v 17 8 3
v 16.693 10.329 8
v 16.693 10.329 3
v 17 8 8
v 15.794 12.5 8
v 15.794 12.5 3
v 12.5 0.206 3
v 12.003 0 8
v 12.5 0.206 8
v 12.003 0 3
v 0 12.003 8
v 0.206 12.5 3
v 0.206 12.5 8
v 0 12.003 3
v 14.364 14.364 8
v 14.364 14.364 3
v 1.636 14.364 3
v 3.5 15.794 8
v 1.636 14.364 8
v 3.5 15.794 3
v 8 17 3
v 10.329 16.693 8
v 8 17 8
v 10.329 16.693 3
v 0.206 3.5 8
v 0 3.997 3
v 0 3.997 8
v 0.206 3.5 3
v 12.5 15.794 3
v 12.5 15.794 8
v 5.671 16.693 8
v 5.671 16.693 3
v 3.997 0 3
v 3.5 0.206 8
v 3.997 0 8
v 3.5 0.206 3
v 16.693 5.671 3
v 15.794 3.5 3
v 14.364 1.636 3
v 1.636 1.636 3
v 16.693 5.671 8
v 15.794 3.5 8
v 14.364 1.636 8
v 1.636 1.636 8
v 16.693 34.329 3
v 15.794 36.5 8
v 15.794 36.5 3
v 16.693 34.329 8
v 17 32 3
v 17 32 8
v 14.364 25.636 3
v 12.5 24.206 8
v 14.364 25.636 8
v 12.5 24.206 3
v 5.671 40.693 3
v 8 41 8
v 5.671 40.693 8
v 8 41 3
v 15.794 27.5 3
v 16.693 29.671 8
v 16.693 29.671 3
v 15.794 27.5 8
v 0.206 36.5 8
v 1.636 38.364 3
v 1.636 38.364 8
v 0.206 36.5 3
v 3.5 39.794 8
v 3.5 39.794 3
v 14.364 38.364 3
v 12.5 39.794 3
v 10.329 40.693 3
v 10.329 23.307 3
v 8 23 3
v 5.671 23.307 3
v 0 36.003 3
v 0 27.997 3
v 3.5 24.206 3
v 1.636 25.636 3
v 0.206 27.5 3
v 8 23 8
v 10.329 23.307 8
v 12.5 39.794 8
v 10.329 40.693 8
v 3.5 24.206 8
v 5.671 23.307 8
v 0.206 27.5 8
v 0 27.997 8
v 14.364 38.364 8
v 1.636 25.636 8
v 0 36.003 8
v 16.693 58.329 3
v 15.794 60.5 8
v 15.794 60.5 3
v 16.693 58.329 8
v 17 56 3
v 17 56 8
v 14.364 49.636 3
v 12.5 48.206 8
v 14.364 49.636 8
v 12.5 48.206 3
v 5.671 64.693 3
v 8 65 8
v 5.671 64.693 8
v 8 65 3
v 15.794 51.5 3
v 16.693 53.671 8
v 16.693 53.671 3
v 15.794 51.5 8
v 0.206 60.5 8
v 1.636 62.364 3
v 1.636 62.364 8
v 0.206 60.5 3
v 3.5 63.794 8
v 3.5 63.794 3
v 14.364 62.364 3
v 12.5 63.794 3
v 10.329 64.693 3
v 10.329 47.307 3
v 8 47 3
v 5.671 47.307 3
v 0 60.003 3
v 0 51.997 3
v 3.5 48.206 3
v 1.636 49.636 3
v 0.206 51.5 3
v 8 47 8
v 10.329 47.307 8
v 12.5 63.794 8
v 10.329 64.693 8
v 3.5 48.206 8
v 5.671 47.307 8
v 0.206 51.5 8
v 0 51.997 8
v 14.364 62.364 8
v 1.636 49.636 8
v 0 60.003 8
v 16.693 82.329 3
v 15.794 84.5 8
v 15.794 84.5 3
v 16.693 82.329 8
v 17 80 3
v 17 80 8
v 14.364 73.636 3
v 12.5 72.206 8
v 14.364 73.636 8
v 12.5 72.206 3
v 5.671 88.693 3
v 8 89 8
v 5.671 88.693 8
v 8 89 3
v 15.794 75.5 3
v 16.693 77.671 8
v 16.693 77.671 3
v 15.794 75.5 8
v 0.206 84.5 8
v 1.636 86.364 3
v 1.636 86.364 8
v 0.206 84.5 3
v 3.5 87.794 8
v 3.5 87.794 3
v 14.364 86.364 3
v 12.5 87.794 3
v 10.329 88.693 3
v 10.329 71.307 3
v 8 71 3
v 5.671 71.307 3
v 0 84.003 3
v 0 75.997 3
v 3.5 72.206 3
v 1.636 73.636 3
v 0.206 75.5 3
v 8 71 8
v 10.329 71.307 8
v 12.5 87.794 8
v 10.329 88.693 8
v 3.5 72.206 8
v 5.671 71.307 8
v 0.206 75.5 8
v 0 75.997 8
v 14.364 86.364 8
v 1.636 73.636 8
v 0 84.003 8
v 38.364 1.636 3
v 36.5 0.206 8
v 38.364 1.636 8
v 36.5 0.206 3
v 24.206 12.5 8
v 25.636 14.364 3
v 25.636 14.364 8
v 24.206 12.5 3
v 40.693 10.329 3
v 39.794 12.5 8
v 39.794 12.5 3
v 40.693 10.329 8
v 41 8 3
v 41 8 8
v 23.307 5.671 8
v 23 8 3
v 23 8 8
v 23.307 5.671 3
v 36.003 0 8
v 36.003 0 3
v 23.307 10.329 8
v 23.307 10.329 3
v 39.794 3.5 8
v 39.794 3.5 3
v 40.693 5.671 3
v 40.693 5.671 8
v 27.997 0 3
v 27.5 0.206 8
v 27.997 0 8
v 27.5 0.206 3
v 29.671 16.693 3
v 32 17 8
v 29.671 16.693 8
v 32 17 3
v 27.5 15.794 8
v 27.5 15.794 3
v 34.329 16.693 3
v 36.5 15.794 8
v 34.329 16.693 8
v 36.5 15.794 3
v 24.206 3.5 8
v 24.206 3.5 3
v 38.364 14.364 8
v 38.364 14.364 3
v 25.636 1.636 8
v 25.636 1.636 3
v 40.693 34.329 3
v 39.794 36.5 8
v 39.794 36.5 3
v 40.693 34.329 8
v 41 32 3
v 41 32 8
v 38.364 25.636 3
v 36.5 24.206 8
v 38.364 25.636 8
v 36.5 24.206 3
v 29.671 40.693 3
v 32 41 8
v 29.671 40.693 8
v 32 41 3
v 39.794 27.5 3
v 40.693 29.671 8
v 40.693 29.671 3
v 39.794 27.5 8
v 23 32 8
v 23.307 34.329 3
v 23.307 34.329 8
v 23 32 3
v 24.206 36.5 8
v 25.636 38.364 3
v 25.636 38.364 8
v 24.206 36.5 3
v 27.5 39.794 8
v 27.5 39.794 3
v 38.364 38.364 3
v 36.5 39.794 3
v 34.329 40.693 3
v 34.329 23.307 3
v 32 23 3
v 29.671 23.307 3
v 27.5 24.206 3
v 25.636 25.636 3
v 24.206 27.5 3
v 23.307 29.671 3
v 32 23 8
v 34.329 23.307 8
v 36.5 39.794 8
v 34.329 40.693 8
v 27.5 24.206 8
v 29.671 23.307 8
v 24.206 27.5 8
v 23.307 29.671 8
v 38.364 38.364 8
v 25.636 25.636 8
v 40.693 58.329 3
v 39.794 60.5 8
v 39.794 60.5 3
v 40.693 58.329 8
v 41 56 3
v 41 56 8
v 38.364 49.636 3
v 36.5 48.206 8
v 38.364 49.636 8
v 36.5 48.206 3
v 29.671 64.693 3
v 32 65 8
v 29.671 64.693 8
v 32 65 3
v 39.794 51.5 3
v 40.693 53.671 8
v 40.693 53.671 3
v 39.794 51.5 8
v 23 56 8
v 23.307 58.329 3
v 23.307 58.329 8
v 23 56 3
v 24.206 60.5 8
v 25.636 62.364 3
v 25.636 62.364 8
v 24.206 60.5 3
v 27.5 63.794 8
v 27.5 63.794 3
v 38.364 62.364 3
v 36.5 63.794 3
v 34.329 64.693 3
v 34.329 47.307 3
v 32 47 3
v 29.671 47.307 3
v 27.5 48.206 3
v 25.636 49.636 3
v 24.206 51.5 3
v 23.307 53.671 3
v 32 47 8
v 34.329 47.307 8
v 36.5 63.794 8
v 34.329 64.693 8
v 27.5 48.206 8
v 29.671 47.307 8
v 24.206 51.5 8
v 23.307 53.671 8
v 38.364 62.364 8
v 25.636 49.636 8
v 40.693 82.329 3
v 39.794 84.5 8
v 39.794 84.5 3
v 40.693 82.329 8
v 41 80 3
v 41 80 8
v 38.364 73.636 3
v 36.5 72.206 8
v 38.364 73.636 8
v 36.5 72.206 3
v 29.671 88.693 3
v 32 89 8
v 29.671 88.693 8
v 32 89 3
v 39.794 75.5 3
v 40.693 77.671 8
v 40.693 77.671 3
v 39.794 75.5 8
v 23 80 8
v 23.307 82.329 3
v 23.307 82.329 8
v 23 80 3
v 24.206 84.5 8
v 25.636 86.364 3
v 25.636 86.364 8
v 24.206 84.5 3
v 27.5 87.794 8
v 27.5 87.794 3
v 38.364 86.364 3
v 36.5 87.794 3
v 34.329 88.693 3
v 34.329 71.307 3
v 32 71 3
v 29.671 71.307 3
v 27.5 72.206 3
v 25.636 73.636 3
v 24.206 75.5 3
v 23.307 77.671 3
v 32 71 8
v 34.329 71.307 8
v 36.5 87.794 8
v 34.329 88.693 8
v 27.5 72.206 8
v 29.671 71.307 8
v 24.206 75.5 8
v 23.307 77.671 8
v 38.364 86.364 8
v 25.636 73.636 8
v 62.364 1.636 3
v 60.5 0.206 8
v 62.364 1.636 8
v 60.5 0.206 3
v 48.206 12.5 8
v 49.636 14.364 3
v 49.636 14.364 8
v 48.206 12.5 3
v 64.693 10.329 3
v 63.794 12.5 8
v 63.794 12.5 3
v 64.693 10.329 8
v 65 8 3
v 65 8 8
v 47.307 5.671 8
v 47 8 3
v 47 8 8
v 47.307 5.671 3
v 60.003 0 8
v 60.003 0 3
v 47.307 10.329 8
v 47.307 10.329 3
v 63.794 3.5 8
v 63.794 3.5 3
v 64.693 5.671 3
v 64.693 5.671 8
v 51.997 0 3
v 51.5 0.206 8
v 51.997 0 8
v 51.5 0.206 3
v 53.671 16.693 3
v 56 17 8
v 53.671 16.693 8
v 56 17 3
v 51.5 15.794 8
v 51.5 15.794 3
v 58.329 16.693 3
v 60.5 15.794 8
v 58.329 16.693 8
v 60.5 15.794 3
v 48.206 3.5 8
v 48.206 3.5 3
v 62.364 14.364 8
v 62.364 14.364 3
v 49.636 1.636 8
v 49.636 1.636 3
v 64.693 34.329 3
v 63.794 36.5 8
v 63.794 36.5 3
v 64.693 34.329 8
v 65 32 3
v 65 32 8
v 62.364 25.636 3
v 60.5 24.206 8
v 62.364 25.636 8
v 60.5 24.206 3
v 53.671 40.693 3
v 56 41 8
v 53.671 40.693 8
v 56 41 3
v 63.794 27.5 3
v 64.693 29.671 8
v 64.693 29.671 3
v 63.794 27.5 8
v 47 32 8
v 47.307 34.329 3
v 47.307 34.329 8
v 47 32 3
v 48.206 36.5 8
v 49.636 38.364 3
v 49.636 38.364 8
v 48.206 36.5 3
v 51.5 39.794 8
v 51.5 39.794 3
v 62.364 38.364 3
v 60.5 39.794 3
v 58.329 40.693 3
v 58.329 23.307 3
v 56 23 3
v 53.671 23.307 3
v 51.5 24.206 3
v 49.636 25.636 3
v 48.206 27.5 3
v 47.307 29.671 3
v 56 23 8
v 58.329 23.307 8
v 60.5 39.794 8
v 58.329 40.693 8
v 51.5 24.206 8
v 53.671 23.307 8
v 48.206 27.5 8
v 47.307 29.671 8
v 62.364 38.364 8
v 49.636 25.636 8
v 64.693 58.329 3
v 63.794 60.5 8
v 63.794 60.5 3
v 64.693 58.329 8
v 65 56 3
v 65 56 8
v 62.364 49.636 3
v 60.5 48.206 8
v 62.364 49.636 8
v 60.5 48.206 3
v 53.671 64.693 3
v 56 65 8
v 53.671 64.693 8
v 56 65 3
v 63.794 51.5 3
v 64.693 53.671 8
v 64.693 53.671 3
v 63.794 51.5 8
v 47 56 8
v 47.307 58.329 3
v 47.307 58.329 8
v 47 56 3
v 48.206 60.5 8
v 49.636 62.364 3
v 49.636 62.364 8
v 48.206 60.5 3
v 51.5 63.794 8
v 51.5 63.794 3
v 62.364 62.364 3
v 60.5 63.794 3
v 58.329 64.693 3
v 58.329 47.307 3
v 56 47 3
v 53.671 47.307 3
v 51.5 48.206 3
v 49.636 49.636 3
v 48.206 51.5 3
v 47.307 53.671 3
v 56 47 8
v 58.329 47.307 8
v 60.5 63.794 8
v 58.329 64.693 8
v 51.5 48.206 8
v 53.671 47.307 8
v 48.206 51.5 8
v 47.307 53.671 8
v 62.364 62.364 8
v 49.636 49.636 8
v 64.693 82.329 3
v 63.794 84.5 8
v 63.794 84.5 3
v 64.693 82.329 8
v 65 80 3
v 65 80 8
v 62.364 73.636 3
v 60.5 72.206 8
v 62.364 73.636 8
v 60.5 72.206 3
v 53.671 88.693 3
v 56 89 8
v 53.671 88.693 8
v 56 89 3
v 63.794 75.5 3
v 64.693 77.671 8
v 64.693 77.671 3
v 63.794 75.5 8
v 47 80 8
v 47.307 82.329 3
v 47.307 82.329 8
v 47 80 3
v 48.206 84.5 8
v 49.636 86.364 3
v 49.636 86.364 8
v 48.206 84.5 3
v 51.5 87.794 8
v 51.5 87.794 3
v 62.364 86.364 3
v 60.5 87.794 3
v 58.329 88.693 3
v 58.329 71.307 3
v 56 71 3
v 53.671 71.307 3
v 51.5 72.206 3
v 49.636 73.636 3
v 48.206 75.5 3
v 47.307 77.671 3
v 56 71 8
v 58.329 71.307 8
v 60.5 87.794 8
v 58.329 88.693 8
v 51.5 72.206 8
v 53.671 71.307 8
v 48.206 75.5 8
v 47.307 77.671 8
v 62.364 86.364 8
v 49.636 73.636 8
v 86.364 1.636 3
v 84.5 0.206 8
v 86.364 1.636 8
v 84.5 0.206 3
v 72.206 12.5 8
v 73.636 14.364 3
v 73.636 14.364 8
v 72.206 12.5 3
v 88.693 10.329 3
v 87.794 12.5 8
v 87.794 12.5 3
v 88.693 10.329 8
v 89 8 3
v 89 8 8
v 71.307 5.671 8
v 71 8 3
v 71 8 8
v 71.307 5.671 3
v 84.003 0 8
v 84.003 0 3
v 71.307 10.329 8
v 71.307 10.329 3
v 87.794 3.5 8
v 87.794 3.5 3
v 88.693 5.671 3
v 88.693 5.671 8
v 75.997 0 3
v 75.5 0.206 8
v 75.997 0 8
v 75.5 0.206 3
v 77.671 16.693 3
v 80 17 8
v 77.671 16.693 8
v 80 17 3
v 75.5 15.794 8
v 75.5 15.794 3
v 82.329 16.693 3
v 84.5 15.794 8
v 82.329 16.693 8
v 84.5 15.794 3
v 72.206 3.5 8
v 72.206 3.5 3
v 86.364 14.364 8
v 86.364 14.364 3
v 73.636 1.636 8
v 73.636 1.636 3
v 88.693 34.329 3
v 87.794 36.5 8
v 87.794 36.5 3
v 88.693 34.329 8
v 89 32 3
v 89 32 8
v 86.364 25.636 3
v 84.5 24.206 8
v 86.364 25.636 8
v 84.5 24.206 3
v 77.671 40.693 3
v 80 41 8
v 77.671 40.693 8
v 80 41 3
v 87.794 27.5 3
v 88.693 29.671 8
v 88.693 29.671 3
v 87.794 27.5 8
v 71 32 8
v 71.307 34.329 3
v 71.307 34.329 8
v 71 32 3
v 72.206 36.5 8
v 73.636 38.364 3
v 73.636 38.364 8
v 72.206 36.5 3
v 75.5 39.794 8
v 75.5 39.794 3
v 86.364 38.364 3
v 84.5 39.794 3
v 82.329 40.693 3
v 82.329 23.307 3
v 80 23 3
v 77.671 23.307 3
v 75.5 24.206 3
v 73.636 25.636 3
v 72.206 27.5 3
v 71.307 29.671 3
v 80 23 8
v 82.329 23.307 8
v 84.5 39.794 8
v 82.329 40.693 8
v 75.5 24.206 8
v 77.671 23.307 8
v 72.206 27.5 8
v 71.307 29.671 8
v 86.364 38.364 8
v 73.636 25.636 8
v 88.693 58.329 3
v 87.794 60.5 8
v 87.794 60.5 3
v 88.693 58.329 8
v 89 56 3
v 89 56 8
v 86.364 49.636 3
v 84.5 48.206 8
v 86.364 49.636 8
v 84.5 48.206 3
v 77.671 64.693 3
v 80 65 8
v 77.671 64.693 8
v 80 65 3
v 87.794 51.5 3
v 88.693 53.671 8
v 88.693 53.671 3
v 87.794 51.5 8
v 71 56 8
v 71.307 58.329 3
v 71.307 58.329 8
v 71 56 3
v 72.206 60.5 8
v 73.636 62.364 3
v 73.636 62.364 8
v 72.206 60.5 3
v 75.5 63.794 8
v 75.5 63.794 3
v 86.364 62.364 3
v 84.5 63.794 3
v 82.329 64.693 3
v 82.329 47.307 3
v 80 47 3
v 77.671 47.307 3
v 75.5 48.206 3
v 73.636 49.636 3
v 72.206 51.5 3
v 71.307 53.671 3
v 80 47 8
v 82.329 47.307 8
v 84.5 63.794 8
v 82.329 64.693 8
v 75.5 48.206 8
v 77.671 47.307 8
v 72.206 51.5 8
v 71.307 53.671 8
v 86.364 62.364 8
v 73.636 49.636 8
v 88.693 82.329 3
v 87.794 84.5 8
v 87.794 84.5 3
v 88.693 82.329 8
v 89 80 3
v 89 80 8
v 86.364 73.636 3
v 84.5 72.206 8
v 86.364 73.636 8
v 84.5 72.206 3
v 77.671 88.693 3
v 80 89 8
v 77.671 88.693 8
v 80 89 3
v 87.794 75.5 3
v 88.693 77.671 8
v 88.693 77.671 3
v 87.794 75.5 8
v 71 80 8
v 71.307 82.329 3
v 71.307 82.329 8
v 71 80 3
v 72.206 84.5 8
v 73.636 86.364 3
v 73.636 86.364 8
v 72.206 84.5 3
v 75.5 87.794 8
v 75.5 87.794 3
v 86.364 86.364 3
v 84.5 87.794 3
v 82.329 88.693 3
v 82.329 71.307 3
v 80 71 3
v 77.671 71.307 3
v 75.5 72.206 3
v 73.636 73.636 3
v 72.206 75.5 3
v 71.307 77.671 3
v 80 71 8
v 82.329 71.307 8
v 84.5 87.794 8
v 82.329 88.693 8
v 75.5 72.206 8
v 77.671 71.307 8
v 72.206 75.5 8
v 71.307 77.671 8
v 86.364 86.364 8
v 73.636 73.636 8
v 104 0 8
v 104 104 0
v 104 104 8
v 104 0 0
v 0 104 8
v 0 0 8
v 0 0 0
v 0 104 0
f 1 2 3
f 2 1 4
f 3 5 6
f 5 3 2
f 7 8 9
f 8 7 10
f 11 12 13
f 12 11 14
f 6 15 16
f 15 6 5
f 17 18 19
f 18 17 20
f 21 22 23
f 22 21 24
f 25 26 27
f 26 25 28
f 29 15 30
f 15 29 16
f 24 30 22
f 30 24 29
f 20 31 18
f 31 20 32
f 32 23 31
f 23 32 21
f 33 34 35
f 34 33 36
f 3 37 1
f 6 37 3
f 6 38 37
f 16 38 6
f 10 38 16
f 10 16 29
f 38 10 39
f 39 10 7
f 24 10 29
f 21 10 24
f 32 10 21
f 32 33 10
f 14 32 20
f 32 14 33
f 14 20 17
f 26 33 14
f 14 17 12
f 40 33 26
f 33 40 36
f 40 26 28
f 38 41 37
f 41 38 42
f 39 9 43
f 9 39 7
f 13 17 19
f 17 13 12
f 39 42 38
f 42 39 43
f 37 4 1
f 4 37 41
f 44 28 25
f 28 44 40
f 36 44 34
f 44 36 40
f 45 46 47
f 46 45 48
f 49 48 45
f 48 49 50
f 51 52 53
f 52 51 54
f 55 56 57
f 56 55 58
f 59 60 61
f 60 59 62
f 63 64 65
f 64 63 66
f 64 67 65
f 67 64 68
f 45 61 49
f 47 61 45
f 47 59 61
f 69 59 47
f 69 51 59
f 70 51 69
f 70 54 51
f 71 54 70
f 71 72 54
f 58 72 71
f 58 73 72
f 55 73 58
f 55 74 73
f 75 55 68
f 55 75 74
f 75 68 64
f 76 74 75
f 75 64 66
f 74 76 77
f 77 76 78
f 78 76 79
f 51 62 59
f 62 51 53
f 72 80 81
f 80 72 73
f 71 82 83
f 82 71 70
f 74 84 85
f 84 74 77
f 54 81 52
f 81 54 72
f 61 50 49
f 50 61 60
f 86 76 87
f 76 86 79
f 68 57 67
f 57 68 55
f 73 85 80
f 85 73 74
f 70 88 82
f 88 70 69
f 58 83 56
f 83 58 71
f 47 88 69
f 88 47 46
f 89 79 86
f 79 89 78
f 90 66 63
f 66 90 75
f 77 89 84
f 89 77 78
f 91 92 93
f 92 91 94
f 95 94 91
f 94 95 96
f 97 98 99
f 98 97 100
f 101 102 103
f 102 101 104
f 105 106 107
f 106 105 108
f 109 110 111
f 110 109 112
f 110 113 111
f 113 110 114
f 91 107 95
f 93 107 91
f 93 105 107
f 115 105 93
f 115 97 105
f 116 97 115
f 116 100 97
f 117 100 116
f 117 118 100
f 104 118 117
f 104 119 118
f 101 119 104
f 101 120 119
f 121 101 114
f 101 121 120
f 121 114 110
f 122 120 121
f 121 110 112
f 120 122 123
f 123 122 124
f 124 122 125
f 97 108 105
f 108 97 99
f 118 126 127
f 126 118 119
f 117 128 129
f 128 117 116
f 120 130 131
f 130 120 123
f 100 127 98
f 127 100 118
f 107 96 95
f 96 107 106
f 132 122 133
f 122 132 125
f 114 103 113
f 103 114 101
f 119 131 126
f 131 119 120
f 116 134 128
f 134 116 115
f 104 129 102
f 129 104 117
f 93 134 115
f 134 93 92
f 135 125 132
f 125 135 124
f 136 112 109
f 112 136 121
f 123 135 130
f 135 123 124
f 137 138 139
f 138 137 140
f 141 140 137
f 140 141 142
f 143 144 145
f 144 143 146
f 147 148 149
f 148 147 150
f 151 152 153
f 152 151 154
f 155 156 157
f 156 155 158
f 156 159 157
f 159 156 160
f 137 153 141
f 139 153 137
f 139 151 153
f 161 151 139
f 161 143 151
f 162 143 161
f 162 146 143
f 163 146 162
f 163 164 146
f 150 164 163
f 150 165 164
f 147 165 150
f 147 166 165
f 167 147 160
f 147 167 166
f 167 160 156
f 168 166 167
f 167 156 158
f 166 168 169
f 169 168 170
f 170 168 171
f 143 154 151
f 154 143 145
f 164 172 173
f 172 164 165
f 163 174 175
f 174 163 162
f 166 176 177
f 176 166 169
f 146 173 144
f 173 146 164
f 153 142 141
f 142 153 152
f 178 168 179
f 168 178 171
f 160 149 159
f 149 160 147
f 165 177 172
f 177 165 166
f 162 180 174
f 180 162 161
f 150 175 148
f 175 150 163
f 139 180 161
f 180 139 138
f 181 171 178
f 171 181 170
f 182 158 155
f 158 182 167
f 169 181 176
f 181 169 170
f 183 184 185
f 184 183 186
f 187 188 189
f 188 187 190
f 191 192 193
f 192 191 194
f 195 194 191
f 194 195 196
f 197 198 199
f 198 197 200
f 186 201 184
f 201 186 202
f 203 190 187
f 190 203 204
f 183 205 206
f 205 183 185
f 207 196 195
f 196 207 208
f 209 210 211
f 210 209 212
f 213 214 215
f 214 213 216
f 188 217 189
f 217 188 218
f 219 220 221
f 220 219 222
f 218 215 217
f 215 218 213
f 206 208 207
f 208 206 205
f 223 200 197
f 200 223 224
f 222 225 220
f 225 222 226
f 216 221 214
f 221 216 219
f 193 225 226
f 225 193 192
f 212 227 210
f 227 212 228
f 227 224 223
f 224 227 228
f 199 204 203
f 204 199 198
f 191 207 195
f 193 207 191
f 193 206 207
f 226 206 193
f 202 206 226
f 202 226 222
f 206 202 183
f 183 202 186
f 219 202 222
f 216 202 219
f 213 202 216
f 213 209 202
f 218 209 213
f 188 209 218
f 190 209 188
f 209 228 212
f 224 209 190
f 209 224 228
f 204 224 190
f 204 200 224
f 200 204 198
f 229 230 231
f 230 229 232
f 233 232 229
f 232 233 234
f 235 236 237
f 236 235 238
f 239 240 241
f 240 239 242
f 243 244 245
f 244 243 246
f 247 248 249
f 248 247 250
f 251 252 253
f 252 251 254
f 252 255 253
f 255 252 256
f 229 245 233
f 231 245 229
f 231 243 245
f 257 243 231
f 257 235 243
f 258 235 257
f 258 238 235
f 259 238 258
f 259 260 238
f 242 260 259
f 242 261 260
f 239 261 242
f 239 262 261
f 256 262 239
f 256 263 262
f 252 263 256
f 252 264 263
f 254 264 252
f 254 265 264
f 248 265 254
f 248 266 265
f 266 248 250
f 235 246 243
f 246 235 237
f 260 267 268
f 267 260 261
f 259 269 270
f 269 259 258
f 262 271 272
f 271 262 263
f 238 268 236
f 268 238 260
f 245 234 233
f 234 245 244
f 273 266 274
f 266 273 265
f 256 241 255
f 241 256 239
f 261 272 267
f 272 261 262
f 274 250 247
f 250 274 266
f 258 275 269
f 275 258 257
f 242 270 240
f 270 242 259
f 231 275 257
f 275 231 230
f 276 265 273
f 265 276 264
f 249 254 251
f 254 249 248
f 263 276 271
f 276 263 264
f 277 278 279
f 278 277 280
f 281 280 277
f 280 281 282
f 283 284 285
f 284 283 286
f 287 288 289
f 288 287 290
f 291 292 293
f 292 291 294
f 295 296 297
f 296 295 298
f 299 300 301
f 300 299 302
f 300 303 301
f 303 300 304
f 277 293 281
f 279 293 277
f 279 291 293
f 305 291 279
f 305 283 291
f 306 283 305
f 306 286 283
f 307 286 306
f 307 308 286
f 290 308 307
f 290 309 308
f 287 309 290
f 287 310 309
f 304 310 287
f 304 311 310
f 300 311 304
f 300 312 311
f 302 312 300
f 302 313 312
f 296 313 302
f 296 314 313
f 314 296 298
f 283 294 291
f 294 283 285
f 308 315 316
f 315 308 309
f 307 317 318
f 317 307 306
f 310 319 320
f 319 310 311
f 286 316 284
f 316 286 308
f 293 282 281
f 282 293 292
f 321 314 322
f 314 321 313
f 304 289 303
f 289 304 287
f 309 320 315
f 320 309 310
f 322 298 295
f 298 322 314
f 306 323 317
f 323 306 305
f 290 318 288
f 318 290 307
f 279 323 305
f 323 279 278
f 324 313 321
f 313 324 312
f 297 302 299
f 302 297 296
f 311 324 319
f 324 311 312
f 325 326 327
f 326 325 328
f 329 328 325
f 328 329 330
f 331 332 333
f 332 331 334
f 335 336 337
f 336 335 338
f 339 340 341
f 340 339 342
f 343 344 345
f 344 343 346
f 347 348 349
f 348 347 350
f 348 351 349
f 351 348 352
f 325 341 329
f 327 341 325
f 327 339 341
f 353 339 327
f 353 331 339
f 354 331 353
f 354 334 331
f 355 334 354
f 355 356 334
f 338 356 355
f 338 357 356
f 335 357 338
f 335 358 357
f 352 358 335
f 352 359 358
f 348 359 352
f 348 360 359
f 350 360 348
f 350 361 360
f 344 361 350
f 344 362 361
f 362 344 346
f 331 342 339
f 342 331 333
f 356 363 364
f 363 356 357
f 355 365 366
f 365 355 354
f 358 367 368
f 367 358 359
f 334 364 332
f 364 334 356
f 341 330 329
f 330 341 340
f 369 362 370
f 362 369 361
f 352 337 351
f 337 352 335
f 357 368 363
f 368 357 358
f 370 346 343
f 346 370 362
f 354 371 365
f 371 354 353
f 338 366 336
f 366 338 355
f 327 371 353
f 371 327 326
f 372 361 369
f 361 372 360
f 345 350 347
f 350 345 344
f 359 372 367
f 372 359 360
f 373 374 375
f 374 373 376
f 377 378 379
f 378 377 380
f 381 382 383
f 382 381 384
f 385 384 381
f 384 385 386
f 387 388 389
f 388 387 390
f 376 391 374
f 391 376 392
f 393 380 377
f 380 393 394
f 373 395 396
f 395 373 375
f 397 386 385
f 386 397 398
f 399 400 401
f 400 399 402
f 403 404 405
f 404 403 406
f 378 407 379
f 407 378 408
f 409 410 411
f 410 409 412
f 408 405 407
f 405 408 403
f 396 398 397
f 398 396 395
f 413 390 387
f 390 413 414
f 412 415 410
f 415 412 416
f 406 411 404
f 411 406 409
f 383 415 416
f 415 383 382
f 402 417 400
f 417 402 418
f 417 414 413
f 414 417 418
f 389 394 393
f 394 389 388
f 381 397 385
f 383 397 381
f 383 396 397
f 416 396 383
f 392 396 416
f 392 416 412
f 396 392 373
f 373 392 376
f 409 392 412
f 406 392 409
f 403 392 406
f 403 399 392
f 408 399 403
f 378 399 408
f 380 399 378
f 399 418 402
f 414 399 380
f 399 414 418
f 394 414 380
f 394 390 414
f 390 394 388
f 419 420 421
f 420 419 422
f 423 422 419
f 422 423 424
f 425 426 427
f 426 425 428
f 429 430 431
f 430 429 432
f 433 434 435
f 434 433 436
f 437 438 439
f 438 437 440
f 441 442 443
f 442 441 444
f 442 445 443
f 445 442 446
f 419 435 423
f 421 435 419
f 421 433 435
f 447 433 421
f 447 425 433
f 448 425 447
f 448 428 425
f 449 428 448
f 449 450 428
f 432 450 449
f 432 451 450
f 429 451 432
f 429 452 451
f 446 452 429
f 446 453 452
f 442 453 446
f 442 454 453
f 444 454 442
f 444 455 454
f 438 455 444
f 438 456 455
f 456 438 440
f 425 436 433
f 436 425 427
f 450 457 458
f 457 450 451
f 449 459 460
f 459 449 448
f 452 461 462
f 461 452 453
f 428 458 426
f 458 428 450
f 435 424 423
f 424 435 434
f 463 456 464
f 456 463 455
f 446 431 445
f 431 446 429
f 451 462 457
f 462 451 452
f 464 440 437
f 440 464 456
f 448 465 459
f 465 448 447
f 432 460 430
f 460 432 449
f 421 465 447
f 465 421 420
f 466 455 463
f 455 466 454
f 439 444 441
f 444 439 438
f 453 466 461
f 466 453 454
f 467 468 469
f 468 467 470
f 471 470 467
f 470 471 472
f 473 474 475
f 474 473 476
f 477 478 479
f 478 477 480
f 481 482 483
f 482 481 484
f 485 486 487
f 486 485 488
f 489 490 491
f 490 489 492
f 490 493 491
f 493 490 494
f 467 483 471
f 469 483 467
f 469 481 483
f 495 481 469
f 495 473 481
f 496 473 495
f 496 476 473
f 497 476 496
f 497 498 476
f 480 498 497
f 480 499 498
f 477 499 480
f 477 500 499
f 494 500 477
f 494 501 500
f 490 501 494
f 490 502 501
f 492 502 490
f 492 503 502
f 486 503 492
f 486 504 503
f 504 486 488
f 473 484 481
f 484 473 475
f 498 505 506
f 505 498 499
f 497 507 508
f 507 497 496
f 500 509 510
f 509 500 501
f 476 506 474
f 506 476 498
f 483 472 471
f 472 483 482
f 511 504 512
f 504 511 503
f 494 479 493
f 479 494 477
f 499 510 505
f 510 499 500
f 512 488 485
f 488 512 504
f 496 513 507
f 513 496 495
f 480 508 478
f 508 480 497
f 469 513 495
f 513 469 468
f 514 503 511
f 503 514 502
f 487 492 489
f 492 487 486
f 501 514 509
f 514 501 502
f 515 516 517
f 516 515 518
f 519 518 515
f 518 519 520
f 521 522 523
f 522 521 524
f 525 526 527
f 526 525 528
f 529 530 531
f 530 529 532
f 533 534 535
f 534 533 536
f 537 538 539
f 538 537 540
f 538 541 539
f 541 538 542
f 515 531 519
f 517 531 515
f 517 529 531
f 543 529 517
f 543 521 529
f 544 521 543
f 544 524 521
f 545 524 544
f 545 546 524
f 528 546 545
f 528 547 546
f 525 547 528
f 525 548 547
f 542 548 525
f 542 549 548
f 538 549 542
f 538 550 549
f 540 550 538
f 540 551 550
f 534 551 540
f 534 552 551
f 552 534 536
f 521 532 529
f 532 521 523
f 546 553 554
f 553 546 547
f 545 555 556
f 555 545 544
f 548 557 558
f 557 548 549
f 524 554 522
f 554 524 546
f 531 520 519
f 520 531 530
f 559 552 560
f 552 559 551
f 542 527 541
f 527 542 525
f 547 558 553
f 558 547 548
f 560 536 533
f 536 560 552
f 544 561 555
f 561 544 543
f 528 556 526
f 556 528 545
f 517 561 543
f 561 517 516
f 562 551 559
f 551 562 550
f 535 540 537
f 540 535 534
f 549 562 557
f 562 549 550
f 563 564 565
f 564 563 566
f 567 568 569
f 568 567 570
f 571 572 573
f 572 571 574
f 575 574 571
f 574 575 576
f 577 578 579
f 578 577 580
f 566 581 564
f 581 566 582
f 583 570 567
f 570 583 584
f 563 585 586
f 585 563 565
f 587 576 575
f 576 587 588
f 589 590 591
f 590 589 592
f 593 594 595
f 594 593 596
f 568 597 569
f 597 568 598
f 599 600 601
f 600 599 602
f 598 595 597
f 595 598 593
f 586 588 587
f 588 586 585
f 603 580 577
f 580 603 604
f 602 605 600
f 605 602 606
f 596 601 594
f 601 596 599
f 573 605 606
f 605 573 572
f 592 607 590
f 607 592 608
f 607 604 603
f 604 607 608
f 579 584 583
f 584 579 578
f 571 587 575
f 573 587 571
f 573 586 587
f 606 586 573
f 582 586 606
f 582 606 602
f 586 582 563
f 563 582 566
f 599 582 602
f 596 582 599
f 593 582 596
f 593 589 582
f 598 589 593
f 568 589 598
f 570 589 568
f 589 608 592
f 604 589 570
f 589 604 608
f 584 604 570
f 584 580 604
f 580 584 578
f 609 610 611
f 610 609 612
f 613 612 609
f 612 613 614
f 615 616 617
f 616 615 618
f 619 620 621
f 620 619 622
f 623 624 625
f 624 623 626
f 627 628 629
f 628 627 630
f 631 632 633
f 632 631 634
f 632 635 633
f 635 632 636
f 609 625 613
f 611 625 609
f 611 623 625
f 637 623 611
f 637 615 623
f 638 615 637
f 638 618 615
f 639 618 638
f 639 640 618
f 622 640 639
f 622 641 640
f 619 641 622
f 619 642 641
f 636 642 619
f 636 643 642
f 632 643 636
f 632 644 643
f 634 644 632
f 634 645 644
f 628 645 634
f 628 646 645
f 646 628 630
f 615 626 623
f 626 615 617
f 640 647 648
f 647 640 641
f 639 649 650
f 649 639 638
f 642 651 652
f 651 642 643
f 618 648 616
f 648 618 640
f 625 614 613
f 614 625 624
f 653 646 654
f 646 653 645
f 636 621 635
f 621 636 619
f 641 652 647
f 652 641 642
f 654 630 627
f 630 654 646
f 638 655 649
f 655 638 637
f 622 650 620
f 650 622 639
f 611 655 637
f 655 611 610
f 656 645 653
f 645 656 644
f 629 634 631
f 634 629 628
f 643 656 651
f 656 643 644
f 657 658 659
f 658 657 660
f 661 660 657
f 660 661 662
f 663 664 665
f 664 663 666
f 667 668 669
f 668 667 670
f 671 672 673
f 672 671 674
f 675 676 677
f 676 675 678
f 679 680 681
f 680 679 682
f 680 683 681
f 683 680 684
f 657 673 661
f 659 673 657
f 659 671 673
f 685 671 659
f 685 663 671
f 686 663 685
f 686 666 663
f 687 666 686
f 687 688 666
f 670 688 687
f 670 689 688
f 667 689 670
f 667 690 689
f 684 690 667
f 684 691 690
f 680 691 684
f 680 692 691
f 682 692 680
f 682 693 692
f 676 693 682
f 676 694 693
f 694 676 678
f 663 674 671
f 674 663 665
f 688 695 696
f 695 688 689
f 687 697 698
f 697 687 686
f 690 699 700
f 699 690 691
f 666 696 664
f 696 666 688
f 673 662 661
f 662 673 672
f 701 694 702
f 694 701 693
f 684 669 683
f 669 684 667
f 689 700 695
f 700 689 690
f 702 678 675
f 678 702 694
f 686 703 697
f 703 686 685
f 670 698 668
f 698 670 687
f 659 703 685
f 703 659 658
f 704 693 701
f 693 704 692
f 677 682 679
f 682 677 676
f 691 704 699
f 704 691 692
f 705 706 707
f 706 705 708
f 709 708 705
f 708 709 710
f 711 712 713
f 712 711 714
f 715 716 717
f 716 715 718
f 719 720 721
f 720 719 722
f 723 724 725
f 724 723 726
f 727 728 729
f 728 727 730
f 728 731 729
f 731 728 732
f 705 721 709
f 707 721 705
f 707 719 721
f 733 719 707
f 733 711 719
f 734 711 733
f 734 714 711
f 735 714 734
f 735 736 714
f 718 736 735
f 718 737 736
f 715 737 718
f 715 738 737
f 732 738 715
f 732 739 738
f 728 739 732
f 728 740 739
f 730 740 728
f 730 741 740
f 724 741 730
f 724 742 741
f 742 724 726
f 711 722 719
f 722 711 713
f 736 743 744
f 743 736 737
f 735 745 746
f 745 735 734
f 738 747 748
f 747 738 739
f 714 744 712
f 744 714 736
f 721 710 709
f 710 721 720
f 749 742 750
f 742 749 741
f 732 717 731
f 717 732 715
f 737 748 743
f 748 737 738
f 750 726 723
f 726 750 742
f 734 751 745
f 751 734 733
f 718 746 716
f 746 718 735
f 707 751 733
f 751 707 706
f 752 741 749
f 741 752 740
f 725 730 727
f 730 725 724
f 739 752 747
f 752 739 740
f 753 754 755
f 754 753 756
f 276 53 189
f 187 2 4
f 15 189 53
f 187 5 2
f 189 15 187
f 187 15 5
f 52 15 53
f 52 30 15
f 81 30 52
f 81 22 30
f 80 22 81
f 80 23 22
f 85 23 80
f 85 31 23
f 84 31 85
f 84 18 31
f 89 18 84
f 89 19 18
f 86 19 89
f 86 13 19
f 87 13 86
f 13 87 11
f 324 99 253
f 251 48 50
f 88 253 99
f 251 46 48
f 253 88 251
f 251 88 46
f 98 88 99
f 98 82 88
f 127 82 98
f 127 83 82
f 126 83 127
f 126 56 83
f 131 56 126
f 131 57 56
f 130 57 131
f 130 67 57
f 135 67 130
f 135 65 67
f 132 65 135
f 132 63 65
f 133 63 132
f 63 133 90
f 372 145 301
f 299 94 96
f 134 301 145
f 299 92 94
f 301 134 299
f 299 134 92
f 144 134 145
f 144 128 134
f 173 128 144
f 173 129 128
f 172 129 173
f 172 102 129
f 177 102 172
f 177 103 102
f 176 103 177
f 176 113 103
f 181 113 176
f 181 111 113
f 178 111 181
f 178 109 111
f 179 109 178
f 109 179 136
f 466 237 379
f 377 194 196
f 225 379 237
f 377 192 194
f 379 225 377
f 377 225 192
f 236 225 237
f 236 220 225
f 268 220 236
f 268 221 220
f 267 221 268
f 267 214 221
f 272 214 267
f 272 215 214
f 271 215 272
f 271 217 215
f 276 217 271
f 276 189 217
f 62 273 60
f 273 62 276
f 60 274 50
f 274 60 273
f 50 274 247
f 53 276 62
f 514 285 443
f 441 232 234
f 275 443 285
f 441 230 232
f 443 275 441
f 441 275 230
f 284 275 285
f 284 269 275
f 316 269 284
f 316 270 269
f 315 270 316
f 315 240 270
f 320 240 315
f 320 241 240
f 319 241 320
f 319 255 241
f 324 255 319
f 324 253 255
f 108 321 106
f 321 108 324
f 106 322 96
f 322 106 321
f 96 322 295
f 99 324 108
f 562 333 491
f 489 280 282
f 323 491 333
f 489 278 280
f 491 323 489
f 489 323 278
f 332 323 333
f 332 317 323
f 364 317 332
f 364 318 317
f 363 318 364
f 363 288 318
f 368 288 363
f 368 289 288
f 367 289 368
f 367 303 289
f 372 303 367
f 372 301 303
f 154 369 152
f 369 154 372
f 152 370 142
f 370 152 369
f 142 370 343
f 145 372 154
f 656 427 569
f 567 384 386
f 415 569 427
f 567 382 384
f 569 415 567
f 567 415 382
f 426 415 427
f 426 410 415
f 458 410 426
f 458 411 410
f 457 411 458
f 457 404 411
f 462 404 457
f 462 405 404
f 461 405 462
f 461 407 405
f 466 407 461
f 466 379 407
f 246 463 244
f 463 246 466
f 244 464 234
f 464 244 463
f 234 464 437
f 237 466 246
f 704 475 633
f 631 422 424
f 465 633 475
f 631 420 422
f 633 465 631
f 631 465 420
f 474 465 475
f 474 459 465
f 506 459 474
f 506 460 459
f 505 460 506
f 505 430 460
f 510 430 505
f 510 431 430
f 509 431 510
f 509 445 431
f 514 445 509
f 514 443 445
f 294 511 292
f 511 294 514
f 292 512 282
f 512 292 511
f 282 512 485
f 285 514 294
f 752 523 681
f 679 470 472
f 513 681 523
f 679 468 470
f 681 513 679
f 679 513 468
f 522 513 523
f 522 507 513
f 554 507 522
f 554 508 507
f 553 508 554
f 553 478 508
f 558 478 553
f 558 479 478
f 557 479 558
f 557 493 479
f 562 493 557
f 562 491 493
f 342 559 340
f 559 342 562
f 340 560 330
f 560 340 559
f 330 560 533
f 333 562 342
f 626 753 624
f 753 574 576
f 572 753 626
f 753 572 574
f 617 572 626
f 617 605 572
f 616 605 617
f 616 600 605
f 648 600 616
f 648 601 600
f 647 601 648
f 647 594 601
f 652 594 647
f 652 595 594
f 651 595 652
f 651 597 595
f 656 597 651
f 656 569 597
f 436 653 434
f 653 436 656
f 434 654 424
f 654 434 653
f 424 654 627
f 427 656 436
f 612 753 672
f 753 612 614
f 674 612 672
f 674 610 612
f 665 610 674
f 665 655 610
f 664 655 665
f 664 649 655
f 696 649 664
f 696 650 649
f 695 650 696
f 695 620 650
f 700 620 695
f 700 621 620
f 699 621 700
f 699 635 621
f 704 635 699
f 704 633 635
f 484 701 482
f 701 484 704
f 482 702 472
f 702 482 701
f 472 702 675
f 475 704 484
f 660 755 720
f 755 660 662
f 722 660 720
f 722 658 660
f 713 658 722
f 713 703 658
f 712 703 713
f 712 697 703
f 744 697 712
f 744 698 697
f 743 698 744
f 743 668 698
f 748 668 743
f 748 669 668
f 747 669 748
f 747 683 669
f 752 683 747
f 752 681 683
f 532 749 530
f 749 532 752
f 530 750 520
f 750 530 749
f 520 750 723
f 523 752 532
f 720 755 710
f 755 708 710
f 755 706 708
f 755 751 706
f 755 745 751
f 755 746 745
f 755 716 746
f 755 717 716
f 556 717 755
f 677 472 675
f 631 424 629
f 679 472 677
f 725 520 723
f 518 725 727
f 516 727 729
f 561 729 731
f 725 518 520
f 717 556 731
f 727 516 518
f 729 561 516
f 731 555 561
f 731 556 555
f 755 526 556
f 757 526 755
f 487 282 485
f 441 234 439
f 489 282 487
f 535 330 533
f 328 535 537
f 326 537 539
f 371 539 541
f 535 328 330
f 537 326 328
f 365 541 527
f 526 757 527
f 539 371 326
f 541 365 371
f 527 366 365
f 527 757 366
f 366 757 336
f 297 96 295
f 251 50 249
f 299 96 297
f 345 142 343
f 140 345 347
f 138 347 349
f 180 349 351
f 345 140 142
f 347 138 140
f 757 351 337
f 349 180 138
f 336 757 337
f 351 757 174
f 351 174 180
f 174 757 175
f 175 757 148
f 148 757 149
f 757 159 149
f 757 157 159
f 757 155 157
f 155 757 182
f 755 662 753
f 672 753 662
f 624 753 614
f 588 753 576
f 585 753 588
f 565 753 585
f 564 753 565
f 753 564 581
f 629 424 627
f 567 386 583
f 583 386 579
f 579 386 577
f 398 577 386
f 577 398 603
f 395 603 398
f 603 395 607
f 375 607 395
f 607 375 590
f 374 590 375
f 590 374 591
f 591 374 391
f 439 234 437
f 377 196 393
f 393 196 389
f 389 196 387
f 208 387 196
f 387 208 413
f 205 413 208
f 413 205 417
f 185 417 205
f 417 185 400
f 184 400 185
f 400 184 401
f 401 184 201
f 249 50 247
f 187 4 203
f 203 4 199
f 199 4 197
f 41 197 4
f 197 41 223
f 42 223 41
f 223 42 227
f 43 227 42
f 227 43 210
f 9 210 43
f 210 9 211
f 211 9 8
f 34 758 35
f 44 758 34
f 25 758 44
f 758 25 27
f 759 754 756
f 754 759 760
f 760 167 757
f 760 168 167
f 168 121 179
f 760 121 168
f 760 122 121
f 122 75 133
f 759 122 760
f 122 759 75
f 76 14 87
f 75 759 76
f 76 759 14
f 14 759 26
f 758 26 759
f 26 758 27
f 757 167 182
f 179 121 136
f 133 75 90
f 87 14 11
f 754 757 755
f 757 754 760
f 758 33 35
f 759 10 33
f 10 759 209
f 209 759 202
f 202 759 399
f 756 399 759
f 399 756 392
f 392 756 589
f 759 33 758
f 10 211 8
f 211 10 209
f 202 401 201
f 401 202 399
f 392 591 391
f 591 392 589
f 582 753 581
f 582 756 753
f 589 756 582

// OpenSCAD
pitch=24; dia=18; rows=4; cols=4;
difference(){
  cube([cols*pitch+8, rows*pitch+8, 8]);
  for(i=[0:cols-1]) for(j=[0:rows-1])
    translate([8+i*pitch, 8+j*pitch, 3]) cylinder(h=6, d=dia, $fn=24);
}
